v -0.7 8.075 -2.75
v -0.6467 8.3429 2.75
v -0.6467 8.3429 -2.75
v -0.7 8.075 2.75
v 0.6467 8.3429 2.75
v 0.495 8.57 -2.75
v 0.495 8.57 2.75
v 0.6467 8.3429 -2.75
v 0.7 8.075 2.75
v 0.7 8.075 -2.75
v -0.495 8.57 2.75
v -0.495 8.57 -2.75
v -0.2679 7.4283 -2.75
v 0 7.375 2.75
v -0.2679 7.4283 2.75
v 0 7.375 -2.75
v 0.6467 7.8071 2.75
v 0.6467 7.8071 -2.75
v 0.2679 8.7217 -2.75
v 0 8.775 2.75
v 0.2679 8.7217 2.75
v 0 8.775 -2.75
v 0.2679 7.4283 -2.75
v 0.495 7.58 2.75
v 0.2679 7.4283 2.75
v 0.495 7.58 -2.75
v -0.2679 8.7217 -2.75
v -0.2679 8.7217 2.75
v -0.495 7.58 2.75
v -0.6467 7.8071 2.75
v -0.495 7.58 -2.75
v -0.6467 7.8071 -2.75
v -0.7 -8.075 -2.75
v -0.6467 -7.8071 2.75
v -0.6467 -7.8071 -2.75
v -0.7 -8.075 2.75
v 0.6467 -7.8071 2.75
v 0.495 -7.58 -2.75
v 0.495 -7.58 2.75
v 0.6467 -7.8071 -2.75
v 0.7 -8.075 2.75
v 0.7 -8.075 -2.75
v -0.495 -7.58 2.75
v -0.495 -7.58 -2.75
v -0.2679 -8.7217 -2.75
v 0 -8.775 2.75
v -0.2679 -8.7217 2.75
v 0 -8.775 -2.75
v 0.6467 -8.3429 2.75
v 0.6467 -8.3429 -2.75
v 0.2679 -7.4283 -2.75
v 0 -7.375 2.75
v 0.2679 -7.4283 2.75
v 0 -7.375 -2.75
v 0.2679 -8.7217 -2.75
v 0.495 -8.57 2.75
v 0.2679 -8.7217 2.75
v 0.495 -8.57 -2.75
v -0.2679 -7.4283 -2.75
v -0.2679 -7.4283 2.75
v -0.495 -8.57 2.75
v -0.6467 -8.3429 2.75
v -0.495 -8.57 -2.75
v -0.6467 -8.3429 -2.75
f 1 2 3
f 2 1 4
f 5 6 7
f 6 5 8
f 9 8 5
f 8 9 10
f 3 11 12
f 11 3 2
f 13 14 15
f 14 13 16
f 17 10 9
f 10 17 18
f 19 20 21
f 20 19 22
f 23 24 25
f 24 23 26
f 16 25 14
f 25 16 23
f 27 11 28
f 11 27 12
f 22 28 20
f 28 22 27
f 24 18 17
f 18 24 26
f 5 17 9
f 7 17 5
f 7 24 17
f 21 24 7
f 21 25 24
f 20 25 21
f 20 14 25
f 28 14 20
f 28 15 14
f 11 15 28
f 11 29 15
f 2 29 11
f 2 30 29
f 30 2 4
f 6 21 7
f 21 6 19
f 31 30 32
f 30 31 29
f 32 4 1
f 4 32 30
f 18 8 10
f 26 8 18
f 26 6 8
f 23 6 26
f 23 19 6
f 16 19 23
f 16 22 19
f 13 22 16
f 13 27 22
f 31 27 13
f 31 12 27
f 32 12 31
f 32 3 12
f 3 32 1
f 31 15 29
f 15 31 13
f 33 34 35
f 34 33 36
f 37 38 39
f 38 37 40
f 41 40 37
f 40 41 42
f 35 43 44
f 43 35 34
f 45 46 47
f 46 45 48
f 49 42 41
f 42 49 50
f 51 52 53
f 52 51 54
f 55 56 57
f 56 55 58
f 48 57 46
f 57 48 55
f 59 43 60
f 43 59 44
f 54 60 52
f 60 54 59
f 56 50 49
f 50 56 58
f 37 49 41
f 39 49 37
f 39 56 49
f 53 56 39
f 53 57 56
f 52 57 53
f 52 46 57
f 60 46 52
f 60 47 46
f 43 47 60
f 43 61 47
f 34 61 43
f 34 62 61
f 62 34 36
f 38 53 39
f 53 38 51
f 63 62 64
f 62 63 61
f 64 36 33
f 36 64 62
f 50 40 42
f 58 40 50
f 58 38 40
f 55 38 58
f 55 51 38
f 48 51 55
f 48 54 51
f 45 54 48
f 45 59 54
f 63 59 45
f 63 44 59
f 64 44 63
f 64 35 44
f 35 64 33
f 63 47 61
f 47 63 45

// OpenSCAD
module twoboltholes(wood_w = 16, gap = 0.3) 
{
    bolthole_diameter = 1.4;
    max_wood_t = 5.5;
    color([0.7,0.1,0.1,1.0])
    {
        translate([0,(wood_w + gap/2)/2,0]) 
        cylinder(h=max_wood_t, r=bolthole_diameter/2, $fn = 16, center=true);
              
        translate([0,(-wood_w - gap/2)/2,0]) 
        cylinder(h=max_wood_t, r=bolthole_diameter/2, $fn = 16, center=true);  
    }
}

twoboltholes();
